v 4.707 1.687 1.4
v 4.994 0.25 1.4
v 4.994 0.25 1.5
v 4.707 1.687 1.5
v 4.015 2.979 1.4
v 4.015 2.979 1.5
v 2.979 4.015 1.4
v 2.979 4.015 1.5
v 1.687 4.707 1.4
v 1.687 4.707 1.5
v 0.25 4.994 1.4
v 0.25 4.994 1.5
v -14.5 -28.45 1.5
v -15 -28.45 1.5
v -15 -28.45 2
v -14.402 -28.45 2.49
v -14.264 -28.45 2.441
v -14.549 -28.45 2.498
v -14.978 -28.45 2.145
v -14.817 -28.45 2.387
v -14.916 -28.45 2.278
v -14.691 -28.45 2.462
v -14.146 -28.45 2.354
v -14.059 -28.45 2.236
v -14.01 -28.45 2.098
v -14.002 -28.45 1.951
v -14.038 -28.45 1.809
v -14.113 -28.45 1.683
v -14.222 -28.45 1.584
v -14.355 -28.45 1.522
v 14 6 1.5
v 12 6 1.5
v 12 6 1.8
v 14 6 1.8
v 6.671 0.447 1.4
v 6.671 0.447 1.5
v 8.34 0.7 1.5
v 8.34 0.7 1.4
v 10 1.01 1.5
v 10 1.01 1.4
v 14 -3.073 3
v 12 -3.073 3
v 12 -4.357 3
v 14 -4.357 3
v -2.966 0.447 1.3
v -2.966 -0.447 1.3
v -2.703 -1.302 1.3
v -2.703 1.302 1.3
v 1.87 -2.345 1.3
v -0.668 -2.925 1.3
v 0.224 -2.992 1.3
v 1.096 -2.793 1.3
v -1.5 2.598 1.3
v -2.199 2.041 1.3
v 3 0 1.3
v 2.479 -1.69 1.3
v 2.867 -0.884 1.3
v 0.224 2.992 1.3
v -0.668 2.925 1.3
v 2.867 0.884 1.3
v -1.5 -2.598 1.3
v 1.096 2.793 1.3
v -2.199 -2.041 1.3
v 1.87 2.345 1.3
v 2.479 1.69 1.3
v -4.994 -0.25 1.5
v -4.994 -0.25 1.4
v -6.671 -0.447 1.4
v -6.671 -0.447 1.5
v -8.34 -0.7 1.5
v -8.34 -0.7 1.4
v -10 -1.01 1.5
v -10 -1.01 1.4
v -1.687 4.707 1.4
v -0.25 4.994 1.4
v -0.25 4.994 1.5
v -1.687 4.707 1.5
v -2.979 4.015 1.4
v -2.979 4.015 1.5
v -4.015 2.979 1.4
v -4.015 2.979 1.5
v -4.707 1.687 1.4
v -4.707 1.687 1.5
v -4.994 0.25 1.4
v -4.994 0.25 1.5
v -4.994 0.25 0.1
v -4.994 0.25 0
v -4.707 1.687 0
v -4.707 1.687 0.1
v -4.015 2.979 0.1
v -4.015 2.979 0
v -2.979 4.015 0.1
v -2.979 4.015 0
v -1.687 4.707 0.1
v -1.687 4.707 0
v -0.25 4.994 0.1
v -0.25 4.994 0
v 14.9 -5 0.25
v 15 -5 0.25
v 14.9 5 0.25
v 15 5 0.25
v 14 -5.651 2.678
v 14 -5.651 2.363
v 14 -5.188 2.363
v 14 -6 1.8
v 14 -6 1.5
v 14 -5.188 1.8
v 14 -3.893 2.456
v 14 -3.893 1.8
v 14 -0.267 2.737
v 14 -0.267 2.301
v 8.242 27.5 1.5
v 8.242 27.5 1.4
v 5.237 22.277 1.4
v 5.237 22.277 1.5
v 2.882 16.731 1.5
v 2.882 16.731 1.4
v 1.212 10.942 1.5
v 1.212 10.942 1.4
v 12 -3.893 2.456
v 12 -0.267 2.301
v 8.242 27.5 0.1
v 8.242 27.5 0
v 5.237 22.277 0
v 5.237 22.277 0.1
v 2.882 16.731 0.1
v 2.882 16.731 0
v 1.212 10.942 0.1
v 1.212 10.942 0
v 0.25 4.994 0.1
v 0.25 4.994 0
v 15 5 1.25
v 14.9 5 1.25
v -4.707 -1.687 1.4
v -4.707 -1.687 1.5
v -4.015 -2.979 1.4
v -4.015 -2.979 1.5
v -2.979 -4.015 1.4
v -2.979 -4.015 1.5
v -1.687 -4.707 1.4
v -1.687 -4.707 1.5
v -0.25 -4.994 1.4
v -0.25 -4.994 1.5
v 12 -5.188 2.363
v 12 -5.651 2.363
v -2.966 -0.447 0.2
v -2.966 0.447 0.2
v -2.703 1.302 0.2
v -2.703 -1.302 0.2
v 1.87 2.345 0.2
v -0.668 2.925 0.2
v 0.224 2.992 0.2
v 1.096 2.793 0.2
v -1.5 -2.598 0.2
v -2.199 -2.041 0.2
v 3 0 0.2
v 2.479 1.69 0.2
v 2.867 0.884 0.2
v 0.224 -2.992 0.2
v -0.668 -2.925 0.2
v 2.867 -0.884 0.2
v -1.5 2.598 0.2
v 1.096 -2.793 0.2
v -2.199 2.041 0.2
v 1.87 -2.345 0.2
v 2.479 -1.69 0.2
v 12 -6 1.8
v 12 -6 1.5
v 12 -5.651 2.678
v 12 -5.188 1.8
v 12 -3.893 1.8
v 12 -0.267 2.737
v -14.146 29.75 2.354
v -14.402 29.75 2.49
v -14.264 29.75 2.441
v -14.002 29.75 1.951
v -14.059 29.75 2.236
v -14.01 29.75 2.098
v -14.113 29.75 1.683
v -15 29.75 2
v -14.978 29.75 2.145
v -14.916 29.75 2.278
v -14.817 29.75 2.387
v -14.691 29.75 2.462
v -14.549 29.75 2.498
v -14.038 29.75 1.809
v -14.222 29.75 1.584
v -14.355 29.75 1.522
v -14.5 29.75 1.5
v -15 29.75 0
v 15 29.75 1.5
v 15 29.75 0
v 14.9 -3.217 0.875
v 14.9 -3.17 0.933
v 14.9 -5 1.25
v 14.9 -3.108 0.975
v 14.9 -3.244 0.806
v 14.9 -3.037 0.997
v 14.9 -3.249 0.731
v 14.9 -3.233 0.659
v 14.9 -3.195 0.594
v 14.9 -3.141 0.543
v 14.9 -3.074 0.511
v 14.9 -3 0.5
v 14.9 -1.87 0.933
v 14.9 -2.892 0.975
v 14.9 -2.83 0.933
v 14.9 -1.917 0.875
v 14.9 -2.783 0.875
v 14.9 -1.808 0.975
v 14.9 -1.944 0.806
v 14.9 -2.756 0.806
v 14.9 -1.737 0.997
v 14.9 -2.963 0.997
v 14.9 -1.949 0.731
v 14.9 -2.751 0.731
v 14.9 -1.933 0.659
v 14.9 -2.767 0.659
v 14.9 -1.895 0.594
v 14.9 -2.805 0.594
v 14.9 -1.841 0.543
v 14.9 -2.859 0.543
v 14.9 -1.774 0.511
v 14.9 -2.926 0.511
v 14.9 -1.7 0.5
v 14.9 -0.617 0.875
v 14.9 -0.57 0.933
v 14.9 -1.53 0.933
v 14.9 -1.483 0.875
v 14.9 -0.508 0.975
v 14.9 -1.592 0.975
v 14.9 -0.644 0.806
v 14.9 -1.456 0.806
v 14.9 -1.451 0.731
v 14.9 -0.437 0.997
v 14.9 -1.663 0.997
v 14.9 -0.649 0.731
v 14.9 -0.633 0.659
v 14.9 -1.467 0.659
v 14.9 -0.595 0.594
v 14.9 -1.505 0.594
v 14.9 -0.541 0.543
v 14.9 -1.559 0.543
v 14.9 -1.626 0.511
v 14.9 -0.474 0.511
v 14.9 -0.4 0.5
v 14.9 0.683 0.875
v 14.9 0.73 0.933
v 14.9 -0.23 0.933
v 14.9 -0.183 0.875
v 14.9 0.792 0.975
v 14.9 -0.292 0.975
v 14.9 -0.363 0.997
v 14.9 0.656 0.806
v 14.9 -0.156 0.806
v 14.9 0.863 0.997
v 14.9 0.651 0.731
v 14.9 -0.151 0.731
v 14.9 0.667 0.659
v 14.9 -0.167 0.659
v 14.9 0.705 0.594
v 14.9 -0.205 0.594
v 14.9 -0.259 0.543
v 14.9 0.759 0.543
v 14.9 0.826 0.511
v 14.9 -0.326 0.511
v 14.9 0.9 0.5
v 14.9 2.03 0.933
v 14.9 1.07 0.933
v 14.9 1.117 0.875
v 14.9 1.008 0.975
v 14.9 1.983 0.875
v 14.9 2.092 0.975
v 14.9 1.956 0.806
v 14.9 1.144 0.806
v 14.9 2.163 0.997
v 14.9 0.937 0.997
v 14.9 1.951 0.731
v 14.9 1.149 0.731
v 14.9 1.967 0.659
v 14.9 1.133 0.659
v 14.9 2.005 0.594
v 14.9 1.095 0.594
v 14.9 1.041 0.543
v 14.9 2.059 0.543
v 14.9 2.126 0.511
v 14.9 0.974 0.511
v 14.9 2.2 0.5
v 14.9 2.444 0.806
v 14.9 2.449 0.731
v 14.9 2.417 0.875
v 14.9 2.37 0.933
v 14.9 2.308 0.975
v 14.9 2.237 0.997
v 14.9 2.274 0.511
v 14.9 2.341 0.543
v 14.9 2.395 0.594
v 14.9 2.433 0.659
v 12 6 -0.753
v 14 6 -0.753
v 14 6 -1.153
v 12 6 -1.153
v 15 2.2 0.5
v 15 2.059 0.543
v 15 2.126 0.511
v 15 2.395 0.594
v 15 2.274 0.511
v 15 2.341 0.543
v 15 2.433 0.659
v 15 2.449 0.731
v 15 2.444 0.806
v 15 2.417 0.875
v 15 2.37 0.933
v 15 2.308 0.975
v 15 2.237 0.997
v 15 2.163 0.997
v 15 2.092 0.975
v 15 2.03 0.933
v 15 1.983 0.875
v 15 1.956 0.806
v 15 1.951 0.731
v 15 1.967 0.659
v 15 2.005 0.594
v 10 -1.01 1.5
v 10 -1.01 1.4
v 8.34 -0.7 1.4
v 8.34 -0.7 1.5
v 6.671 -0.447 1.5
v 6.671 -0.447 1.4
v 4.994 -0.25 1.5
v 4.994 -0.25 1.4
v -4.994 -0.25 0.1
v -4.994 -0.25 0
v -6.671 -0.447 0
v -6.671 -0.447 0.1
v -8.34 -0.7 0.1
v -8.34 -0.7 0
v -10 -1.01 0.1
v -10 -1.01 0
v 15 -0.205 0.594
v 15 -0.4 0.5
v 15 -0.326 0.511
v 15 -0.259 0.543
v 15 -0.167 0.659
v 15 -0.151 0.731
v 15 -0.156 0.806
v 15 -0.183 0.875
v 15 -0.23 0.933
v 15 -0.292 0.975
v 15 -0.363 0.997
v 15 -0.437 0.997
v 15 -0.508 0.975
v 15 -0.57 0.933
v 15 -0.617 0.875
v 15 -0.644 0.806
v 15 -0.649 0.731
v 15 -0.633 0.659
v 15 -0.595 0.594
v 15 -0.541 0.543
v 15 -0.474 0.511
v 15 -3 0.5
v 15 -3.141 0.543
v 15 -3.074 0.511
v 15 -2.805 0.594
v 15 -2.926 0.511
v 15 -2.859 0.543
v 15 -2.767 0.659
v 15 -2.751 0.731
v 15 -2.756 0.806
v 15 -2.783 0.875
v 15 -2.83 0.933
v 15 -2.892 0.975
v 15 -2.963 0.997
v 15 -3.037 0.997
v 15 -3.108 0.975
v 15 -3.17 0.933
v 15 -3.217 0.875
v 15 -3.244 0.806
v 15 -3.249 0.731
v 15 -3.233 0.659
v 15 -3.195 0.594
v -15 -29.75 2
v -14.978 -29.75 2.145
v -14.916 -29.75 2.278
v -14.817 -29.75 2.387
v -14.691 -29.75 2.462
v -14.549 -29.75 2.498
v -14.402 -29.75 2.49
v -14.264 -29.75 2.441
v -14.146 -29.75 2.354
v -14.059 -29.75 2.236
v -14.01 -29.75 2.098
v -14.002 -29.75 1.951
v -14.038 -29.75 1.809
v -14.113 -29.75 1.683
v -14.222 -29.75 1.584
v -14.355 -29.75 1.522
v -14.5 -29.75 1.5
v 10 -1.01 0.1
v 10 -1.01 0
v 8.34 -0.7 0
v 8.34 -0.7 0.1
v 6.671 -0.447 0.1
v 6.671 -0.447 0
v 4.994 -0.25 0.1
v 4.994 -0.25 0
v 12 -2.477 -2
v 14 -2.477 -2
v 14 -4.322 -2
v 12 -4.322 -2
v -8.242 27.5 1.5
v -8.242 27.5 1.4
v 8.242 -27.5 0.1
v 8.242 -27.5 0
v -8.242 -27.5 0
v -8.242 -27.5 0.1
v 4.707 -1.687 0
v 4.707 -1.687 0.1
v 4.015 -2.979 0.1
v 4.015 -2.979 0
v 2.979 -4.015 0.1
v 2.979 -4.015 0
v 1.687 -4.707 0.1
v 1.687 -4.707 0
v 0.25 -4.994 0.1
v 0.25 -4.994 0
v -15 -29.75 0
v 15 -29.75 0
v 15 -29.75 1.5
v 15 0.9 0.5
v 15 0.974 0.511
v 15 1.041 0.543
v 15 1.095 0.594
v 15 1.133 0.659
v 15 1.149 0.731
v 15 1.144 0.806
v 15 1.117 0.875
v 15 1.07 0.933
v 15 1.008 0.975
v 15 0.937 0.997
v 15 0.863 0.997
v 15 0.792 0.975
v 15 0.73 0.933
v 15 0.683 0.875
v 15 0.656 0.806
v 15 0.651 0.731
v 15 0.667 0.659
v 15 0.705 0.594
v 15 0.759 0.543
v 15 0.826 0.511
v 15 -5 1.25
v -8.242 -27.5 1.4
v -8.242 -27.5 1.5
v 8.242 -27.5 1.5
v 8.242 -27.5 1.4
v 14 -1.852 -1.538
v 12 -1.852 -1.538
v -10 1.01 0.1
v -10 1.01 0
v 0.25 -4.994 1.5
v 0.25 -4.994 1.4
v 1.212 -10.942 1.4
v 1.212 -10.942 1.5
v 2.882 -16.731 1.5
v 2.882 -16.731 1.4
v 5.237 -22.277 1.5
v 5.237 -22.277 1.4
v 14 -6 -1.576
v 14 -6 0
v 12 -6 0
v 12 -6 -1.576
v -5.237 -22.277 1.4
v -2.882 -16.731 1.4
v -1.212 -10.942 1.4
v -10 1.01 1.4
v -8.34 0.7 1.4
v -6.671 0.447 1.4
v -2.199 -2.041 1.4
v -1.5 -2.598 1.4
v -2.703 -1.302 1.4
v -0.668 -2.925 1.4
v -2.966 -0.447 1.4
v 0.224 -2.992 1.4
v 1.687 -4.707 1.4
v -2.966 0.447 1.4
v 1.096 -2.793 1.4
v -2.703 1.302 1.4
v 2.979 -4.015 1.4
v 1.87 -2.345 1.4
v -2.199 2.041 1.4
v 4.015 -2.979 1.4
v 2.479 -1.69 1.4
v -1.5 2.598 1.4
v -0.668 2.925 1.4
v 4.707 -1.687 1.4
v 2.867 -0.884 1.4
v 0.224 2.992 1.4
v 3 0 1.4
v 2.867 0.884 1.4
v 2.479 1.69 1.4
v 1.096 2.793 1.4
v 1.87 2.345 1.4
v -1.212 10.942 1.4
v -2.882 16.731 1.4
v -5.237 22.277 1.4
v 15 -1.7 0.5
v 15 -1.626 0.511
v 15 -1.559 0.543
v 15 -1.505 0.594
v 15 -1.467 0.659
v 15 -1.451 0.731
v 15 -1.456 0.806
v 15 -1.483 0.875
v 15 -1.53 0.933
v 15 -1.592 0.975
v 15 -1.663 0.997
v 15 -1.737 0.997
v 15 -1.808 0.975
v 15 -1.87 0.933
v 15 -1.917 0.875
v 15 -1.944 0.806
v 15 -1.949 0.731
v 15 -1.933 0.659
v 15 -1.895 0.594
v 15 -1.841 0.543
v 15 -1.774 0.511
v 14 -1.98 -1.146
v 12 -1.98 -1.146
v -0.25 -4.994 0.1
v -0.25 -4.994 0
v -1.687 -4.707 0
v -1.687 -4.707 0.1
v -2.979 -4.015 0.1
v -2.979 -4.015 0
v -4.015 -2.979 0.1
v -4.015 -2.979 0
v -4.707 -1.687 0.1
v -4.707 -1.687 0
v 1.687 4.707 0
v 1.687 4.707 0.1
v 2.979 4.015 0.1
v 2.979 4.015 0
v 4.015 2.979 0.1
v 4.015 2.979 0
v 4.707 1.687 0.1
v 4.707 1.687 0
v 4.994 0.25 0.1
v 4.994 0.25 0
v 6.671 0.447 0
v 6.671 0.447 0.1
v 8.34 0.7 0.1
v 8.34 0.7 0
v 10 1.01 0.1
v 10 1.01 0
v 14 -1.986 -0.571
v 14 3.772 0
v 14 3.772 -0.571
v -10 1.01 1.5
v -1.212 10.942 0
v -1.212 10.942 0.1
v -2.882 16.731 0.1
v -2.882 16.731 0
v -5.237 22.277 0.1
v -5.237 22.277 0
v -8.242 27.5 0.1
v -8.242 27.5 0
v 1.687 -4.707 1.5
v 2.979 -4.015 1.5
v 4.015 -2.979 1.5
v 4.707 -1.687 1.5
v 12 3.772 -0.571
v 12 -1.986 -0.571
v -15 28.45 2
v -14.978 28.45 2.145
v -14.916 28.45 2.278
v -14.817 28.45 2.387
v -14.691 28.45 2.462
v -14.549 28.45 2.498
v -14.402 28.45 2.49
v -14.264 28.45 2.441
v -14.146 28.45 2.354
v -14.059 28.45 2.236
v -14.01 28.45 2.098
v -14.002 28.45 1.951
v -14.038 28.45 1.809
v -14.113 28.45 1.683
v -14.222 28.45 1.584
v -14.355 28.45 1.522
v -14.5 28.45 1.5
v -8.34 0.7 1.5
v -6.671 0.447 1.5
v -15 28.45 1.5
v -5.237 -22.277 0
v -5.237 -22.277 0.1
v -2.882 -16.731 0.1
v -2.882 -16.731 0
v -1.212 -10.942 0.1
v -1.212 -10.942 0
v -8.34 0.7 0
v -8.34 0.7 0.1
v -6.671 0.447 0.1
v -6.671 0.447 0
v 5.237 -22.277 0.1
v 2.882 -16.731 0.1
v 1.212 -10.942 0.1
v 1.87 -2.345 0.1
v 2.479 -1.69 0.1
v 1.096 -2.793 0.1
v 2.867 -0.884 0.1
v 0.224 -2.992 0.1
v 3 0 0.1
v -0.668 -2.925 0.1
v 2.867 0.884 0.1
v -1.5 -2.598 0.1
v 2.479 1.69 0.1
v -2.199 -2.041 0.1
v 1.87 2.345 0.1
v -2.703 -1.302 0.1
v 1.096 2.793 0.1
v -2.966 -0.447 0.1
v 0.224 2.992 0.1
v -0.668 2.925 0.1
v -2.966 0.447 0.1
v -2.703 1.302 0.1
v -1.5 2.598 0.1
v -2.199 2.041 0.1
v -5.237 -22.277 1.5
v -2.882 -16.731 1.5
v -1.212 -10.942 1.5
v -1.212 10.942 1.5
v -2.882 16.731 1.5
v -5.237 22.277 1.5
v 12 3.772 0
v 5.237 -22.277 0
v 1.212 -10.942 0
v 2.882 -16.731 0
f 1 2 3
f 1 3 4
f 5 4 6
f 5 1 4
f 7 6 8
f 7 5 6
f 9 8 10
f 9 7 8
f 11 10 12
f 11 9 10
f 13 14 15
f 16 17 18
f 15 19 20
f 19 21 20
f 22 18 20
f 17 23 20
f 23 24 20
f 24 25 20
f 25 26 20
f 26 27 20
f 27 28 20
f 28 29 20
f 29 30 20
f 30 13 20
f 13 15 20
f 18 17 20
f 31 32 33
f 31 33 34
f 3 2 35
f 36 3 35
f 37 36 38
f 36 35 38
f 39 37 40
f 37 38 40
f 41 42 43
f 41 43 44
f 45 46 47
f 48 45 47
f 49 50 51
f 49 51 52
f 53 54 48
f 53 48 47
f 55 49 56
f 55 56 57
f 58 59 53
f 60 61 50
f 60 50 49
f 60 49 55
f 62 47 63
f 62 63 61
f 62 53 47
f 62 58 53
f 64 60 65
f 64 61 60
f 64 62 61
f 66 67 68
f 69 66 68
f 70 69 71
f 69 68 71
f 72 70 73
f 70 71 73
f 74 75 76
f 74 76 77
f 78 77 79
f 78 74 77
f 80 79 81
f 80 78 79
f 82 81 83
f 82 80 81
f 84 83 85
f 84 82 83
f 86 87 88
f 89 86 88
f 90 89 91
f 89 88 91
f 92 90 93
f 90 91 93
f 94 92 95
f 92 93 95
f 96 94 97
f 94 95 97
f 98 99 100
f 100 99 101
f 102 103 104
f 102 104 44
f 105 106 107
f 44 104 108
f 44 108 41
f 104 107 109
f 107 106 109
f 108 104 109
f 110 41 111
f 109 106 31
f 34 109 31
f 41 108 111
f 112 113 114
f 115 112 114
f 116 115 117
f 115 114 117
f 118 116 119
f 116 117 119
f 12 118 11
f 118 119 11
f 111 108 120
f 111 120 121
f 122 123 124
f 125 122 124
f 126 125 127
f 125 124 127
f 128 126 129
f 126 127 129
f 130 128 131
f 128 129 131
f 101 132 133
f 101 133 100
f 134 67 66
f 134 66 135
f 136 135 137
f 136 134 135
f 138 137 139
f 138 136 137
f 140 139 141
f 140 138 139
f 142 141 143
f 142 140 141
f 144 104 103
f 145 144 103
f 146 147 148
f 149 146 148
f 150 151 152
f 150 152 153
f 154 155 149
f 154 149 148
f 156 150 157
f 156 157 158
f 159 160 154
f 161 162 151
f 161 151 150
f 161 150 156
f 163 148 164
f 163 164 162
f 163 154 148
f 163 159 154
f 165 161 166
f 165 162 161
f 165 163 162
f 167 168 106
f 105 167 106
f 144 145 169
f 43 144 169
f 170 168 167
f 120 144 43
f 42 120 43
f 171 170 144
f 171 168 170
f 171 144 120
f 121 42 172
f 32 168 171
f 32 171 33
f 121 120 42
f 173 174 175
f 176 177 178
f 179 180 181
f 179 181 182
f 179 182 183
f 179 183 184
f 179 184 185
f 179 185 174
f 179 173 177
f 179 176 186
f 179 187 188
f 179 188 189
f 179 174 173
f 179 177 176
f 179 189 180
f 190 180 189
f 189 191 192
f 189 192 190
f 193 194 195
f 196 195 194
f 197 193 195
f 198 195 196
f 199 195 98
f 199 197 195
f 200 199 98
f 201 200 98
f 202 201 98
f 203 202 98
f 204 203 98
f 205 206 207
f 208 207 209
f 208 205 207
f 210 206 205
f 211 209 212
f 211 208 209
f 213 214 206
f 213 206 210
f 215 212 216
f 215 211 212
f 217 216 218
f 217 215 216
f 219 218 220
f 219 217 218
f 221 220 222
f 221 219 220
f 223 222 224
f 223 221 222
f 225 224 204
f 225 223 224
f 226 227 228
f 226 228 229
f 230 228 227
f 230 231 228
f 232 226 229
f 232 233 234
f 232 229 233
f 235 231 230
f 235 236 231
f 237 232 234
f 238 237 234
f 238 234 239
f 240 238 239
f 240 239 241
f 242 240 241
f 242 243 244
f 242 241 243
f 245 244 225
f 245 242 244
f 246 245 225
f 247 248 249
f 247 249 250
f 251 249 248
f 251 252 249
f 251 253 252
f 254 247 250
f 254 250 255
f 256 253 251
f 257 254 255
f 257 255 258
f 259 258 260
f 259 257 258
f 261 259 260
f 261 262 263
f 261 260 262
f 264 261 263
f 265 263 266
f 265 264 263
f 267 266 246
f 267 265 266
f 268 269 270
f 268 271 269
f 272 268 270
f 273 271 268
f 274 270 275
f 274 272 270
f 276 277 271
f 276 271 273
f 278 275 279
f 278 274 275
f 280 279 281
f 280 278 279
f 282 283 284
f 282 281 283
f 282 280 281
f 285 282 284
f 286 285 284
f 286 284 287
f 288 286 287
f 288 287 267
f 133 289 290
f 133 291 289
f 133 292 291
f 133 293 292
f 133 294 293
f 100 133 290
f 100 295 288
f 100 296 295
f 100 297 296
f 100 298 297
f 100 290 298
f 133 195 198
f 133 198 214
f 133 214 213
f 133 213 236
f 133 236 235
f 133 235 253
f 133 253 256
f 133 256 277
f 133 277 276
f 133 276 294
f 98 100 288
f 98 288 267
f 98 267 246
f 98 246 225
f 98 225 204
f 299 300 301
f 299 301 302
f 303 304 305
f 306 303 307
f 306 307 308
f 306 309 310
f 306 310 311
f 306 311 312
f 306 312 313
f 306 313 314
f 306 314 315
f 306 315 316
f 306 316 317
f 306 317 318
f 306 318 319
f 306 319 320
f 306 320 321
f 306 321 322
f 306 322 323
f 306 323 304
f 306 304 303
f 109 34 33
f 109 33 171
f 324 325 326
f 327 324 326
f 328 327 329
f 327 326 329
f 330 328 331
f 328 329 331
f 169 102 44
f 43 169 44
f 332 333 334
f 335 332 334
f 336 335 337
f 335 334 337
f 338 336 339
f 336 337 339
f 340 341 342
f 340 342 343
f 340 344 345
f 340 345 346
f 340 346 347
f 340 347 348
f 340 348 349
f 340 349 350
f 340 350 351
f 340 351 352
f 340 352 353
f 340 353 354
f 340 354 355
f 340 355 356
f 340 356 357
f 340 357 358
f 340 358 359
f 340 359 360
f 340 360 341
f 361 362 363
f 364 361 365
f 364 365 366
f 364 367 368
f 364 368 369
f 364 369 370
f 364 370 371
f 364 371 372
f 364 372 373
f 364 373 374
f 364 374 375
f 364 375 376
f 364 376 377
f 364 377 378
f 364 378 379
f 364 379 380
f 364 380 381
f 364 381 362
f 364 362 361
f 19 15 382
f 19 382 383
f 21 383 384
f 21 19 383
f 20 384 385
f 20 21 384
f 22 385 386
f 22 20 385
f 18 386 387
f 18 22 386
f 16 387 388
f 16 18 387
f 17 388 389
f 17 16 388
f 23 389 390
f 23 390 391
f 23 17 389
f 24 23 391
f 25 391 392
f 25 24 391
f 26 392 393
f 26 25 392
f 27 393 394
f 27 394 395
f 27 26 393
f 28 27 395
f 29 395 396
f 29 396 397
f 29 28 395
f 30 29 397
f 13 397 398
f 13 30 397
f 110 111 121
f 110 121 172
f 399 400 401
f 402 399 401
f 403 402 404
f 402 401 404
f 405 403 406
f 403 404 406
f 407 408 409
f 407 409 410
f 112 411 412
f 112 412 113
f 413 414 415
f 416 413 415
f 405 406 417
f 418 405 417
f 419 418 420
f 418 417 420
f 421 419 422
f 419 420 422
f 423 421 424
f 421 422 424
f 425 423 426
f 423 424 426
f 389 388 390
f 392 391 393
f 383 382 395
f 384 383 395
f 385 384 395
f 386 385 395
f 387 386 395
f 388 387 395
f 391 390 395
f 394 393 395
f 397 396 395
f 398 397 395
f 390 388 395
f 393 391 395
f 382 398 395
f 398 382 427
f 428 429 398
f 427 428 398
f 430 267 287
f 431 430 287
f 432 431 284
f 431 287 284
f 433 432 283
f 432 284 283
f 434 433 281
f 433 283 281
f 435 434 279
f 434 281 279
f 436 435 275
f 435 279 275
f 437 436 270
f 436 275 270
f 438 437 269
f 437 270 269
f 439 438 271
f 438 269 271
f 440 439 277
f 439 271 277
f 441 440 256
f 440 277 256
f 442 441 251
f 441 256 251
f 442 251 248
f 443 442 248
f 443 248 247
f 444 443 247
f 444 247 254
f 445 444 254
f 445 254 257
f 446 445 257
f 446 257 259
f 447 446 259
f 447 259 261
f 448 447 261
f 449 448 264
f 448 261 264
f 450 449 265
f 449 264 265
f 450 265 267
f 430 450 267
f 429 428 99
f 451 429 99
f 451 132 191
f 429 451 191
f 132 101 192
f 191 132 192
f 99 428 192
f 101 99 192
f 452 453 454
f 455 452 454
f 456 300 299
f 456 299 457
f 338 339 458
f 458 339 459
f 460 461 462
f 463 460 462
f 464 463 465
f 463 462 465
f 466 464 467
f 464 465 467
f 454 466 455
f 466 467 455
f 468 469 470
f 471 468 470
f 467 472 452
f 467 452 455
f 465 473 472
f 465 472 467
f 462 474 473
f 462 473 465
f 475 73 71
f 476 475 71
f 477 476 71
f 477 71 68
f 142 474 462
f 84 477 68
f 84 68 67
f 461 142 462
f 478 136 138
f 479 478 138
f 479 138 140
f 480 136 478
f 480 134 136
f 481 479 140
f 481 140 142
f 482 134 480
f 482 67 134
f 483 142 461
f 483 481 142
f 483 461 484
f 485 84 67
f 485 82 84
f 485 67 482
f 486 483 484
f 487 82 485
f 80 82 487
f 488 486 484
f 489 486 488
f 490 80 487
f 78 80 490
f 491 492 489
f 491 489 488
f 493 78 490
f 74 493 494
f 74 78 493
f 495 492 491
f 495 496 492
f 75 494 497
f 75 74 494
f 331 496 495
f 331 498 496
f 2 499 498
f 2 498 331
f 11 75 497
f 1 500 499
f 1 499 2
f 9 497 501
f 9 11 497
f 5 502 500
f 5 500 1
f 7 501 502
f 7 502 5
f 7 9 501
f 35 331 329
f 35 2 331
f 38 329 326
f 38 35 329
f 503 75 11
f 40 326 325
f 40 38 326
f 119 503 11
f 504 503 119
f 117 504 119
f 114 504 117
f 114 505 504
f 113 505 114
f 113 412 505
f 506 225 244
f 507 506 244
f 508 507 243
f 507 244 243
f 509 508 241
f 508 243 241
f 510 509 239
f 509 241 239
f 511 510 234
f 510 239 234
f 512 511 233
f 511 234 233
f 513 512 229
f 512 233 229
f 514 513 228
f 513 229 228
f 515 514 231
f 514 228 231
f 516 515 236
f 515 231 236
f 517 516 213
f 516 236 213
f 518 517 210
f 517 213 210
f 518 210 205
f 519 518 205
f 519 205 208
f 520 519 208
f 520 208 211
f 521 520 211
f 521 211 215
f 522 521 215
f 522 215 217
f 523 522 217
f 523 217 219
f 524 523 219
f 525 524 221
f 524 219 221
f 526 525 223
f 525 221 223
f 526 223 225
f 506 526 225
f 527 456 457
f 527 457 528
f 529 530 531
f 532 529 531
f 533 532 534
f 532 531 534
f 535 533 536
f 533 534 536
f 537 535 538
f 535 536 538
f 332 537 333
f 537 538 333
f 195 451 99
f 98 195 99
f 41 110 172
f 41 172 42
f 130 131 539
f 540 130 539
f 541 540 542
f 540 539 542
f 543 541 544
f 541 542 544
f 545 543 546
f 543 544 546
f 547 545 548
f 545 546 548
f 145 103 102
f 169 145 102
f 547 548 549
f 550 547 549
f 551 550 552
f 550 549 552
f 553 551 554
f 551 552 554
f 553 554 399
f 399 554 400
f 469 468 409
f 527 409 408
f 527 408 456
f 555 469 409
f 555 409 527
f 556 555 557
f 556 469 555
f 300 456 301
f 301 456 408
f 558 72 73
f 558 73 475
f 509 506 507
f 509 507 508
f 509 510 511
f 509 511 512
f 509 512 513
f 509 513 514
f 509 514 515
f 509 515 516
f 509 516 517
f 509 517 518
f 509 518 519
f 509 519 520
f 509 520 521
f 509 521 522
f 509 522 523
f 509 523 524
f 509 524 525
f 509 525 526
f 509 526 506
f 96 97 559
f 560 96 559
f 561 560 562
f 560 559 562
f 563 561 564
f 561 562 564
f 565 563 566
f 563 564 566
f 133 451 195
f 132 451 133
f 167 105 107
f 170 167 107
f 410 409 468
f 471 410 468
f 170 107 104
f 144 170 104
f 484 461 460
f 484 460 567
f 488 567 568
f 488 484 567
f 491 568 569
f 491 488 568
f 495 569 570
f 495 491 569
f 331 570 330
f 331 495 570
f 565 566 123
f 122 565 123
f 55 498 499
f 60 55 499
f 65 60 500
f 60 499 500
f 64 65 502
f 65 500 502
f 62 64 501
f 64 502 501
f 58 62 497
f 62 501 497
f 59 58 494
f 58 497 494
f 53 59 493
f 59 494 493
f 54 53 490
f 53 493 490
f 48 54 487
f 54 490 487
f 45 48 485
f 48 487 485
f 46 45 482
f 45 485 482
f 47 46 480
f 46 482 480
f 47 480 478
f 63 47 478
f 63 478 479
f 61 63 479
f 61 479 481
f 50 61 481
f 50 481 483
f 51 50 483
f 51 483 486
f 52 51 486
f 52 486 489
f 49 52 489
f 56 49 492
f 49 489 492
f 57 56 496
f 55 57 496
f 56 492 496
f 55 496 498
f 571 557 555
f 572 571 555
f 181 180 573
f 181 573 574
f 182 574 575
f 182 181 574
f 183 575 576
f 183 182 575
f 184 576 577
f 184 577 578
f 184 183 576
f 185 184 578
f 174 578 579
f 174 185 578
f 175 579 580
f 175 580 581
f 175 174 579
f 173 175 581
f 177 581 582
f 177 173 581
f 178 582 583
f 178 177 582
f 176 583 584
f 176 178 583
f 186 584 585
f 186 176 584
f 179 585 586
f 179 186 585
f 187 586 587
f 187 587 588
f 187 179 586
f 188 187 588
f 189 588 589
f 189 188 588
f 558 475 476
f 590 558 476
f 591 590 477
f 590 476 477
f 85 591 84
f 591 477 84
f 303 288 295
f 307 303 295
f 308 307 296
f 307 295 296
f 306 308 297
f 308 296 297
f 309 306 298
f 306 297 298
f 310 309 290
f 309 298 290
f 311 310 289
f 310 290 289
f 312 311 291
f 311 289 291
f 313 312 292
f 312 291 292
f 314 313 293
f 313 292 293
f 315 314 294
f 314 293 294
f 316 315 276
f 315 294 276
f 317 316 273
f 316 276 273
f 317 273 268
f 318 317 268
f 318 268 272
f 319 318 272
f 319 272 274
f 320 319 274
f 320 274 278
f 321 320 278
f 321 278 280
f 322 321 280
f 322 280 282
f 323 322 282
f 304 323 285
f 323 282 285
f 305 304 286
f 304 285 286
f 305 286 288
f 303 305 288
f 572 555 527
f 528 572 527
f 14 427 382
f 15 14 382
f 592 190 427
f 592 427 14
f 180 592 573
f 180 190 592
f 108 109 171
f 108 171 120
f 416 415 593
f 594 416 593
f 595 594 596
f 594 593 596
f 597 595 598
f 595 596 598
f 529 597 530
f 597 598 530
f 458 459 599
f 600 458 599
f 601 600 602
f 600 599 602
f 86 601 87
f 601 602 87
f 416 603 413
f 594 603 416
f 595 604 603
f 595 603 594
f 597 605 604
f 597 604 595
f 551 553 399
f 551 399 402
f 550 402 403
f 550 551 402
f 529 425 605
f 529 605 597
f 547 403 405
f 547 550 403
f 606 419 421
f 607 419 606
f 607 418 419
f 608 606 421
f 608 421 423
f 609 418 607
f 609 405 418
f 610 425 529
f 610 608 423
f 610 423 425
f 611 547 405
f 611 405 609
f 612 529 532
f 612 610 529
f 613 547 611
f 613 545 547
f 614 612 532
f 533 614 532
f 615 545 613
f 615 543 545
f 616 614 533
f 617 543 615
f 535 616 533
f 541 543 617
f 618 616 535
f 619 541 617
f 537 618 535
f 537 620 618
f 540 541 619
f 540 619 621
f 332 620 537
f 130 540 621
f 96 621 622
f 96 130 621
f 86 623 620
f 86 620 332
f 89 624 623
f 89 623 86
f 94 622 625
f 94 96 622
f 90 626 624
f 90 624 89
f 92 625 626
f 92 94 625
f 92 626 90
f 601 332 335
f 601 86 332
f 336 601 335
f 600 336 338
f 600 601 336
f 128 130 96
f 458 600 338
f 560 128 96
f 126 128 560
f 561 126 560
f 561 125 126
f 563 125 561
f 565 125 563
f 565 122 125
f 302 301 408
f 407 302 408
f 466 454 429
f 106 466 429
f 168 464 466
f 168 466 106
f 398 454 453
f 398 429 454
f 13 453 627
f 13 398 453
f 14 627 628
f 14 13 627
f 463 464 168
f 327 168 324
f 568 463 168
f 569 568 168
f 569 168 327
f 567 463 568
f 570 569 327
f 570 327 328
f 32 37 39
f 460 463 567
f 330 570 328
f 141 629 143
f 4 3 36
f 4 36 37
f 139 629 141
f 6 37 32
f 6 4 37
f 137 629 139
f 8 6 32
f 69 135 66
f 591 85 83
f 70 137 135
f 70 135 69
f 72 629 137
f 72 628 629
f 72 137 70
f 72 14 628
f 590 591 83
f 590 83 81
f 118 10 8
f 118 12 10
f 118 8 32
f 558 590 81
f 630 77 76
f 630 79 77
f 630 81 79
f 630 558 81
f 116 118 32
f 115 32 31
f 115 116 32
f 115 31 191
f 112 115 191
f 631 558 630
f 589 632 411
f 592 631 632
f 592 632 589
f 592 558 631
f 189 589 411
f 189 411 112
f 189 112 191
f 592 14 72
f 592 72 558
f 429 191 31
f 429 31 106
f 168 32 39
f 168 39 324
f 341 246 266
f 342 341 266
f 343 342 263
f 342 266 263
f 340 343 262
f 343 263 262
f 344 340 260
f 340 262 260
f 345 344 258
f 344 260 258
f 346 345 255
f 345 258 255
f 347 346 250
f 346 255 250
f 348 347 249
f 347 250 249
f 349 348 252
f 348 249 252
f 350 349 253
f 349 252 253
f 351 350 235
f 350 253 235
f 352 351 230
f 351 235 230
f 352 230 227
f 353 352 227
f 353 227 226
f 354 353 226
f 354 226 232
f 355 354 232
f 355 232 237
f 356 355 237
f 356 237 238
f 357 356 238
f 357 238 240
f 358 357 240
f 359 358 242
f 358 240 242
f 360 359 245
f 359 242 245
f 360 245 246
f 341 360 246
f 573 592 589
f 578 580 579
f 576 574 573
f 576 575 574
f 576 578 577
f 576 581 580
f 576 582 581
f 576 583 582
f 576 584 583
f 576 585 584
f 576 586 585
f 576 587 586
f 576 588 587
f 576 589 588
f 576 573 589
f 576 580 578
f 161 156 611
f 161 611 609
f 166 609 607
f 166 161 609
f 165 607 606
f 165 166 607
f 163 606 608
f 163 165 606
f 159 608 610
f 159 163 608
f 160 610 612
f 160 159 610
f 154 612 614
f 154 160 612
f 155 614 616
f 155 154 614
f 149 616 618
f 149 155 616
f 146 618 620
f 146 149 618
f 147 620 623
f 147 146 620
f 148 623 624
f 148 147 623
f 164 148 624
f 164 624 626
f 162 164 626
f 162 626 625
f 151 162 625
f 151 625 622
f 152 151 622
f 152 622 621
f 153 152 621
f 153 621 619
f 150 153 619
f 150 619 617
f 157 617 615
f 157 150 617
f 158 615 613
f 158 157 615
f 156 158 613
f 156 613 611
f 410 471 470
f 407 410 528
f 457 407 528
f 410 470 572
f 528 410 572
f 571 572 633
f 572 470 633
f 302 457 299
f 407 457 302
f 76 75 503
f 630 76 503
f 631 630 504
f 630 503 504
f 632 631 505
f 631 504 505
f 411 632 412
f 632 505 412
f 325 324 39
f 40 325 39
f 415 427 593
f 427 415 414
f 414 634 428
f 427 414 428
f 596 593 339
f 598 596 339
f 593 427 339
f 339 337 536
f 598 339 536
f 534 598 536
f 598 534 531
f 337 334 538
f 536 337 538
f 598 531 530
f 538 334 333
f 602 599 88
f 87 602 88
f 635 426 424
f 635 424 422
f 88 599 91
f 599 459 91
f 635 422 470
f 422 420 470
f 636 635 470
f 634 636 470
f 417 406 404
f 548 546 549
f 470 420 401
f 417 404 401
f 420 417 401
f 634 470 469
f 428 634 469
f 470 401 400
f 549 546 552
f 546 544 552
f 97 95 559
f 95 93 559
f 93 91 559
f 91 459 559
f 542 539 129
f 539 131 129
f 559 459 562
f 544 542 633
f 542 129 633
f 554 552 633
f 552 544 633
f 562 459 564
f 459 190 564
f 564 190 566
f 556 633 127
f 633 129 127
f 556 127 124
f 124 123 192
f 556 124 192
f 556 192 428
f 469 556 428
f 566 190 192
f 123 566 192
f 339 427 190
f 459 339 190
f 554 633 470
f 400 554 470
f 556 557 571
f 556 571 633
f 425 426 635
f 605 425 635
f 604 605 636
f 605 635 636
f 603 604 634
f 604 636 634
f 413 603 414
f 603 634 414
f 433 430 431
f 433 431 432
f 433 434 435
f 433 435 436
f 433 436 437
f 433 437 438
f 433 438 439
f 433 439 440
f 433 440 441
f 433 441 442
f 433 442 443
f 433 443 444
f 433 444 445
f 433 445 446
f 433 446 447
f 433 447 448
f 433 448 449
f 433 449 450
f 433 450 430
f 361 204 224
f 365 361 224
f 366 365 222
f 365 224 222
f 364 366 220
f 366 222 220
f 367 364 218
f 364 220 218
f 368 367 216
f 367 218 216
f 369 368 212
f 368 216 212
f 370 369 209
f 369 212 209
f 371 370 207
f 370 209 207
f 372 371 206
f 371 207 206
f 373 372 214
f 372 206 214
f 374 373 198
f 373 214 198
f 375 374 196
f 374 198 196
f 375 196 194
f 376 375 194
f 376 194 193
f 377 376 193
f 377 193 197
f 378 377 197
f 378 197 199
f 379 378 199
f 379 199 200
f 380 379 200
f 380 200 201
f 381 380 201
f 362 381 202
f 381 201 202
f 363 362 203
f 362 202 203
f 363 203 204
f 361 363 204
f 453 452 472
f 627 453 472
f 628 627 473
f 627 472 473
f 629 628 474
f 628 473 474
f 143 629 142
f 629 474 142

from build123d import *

# Parameters (mm, degrees)
SKETCH_1_W           = 30
SKETCH_1_H           = 59.5
EXTRUDE_1_DEPTH      = 1.5
SKETCH_2_W           = 20
SKETCH_2_H           = 55
CUT_EXTRUDE_1_DEPTH  = 0.1
SKETCH_3_R           = 5
EXTRUDE_2_DEPTH      = 0.1
EXTRUDE_3_DEPTH      = 0.1
CUT_EXTRUDE_START    = -0.1
SKETCH_5_R           = 5
CUT_EXTRUDE_2_DEPTH  = 0.1
SKETCH_6_R           = 3
CUT_EXTRUDE_3_DEPTH  = 0.1
CUT_EXTRUDE_4_DEPTH  = 0.1
SKETCH_8_R           = 3
CUT_EXTRUDE_5_DEPTH  = 0.1
SKETCH_9_W           = 1
SKETCH_9_H           = 10
CUT_EXTRUDE_6_DEPTH  = 0.1
SKETCH_10_R          = 0.25
EXTRUDE_4_DEPTH      = 0.1
SKETCH_11_W          = 2
SKETCH_11_H          = 12
EXTRUDE_5_DEPTH      = 1.5
CUT_EXTRUDE_7_DEPTH  = 42.654081433
SKETCH_13_W          = 2
SKETCH_13_H          = 12
EXTRUDE_6_DEPTH      = 2
CUT_EXTRUDE_8_DEPTH  = 42.654081433
CUT_EXTRUDE_9_DEPTH  = 42.654081433
CUT_EXTRUDE_10_DEPTH = 42.654081433
SKETCH_18_R          = 0.5
EXTRUDE_7_DEPTH      = 59.5
SKETCH_19_W          = 1
SKETCH_19_H          = 56.9
CUT_EXTRUDE_11_DEPTH = 2


with BuildPart() as part:
    # 草圖1 → 填料-伸長1 (new body)
    with BuildSketch(Plane.XY):
        Rectangle(SKETCH_1_W, SKETCH_1_H)
    extrude(amount=EXTRUDE_1_DEPTH)

    # 草圖2 → 除料-伸長1 (cut)
    with BuildSketch(Plane.XY.offset(1.5)):
        Rectangle(SKETCH_2_W, SKETCH_2_H)
    extrude(amount=-CUT_EXTRUDE_1_DEPTH, mode=Mode.SUBTRACT)

    # 草圖3 → 填料-伸長2 (add)
    with BuildSketch(Plane.XY.offset(1.4)):
        Circle(SKETCH_3_R)
    extrude(amount=EXTRUDE_2_DEPTH)

    # 草圖4 → 填料-伸長3 (add)
    with BuildSketch(Plane.XY.offset(1.4)):
        with BuildLine():
            ThreePointArc((4.993746089, 0.25), (7.506502742, 0.566687178), (10, 1.010205144))
            Line((10, 1.010205144), (10, 27.5))
            Line((10, 27.5), (8.241767279, 27.5))
            ThreePointArc((8.241767279, 27.5), (2.882359671, 16.731048078), (0.25, 4.993746089))
            ThreePointArc((0.25, 4.993746089), (3.535533906, 3.535533906), (4.993746089, 0.25))
        make_face()
        with BuildLine():
            ThreePointArc((0.25, -4.993746089), (2.882359671, -16.731048078), (8.241767279, -27.5))
            Line((8.241767279, -27.5), (10, -27.5))
            Line((10, -27.5), (10, -1.010205144))
            ThreePointArc((10, -1.010205144), (7.506502742, -0.566687178), (4.993746089, -0.25))
            ThreePointArc((4.993746089, -0.25), (3.535533906, -3.535533906), (0.25, -4.993746089))
        make_face()
        with BuildLine():
            Line((-10, -27.5), (-8.241767279, -27.5))
            ThreePointArc((-8.241767279, -27.5), (-2.882359671, -16.731048078), (-0.25, -4.993746089))
            ThreePointArc((-0.25, -4.993746089), (-3.535533906, -3.535533906), (-4.993746089, -0.25))
            ThreePointArc((-4.993746089, -0.25), (-7.506502742, -0.566687178), (-10, -1.010205144))
            Line((-10, -1.010205144), (-10, -27.5))
        make_face()
        with BuildLine():
            Line((-10, 27.5), (-10, 1.010205144))
            ThreePointArc((-10, 1.010205144), (-7.506502742, 0.566687178), (-4.993746089, 0.25))
            ThreePointArc((-4.993746089, 0.25), (-3.535533906, 3.535533906), (-0.25, 4.993746089))
            ThreePointArc((-0.25, 4.993746089), (-2.882359671, 16.731048078), (-8.241767279, 27.5))
            Line((-8.241767279, 27.5), (-10, 27.5))
        make_face()
    extrude(amount=EXTRUDE_3_DEPTH)

    # 草圖5 → 除料-伸長2 (cut)
    with BuildSketch(Plane.XY.offset(1.5).offset(CUT_EXTRUDE_START)):
        Circle(SKETCH_5_R)
    extrude(amount=CUT_EXTRUDE_2_DEPTH, mode=Mode.SUBTRACT)

    # 草圖6 → 除料-伸長3 (cut)
    with BuildSketch(Plane.XY.offset(1.4)):
        Circle(SKETCH_6_R)
    extrude(amount=-CUT_EXTRUDE_3_DEPTH, mode=Mode.SUBTRACT)

    # 草圖7 → 除料-伸長4 (cut)
    with BuildSketch(Plane(origin=(0, 0, 0), x_dir=(-1, 0, 0), z_dir=(0, 0, -1))):
        with BuildLine():
            Line((-8.241767279, -27.5), (8.241767279, -27.5))
            ThreePointArc((8.241767279, -27.5), (2.882359671, -16.731048078), (0.25, -4.993746089))
            ThreePointArc((0.25, -4.993746089), (3.535533906, -3.535533906), (4.993746089, -0.25))
            ThreePointArc((4.993746089, -0.25), (7.506502742, -0.566687178), (10, -1.010205144))
            Line((10, -1.010205144), (10, 1.010205144))
            ThreePointArc((10, 1.010205144), (7.506502742, 0.566687178), (4.993746089, 0.25))
            ThreePointArc((4.993746089, 0.25), (3.535533906, 3.535533906), (0.25, 4.993746089))
            ThreePointArc((0.25, 4.993746089), (2.882359671, 16.731048078), (8.241767279, 27.5))
            Line((8.241767279, 27.5), (-8.241767279, 27.5))
            ThreePointArc((-8.241767279, 27.5), (-2.882359671, 16.731048078), (-0.25, 4.993746089))
            ThreePointArc((-0.25, 4.993746089), (-3.535533906, 3.535533906), (-4.993746089, 0.25))
            ThreePointArc((-4.993746089, 0.25), (-7.506502742, 0.566687178), (-10, 1.010205144))
            Line((-10, 1.010205144), (-10, -1.010205144))
            ThreePointArc((-10, -1.010205144), (-7.506502742, -0.566687178), (-4.993746089, -0.25))
            ThreePointArc((-4.993746089, -0.25), (-3.535533906, -3.535533906), (-0.25, -4.993746089))
            ThreePointArc((-0.25, -4.993746089), (-2.882359671, -16.731048078), (-8.241767279, -27.5))
        make_face()
    extrude(amount=-CUT_EXTRUDE_4_DEPTH, mode=Mode.SUBTRACT)

    # 草圖8 → 除料-伸長5 (cut)
    with BuildSketch(Plane(origin=(0, 0, 0.1), x_dir=(-1, 0, 0), z_dir=(0, 0, -1)).offset(CUT_EXTRUDE_START)):
        with Locations(Location((0, 0, 0), (0, 0, 180))):
            Circle(SKETCH_8_R)
    extrude(amount=CUT_EXTRUDE_5_DEPTH, mode=Mode.SUBTRACT)

    # 草圖9 → 除料-伸長6 (cut)
    with BuildSketch(Plane(origin=(15, 0, 0), x_dir=(0, 0, -1), z_dir=(1, 0, 0))):
        with Locations((-0.75, 0)):
            Rectangle(SKETCH_9_W, SKETCH_9_H)
    extrude(amount=-CUT_EXTRUDE_6_DEPTH, mode=Mode.SUBTRACT)

    # 草圖10 → 填料-伸長4 (add)
    with BuildSketch(Plane(origin=(14.9, 0, 0), x_dir=(0, 0, -1), z_dir=(1, 0, 0))):
        with Locations((-0.75, -3)):
            Circle(SKETCH_10_R)
        with Locations((-0.75, -1.7)):
            Circle(SKETCH_10_R)
        with Locations((-0.75, -0.4)):
            Circle(SKETCH_10_R)
        with Locations((-0.75, 0.9)):
            Circle(SKETCH_10_R)
        with Locations((-0.75, 2.2)):
            Circle(SKETCH_10_R)
    extrude(amount=EXTRUDE_4_DEPTH)

    # 草圖11 → 填料-伸長5 (add)
    with BuildSketch(Plane.XY.offset(1.5)):
        with Locations((13, 0)):
            Rectangle(SKETCH_11_W, SKETCH_11_H)
    extrude(amount=EXTRUDE_5_DEPTH)

    # 草圖12 → 除料-伸長7 (cut, through all)
    with BuildSketch(Plane(origin=(14, 0, 0), x_dir=(0, 0, -1), z_dir=(1, 0, 0))):
        Polygon((-1.8, 6), (-1.8, -3.892813963), (-2.45595706, -3.892813963), (-2.301062562, -0.267088334), (-2.736577143, -0.267088334), (-3, -3.073435974), (-3, 6), align=None)
        Polygon((-3, -6), (-1.8, -6), (-1.8, -5.188306953), (-2.363031893, -5.188306953), (-2.363031893, -5.650911739), (-2.678275837, -5.650911739), (-3, -4.356848884), align=None)
    extrude(amount=-CUT_EXTRUDE_7_DEPTH, mode=Mode.SUBTRACT)

    # 草圖13 → 填料-伸長6 (add)
    with BuildSketch(Plane(origin=(0, 0, 0), x_dir=(-1, 0, 0), z_dir=(0, 0, -1))):
        with Locations((-13, 0)):
            Rectangle(SKETCH_13_W, SKETCH_13_H)
    extrude(amount=EXTRUDE_6_DEPTH)

    # 草圖14 → 除料-伸長8 (cut, through all)
    with BuildSketch(Plane(origin=(14, 0, 0), x_dir=(0, 0, -1), z_dir=(1, 0, 0))):
        Polygon((1.152930519, 6), (2, -2.477443224), (2, 6), align=None)
        Polygon((2, -4.322370965), (1.57646526, -6), (2, -6), align=None)
    extrude(amount=-CUT_EXTRUDE_8_DEPTH, mode=Mode.SUBTRACT)

    # 草圖15 → 除料-伸長9 (cut, through all)
    with BuildSketch(Plane(origin=(14, 0, 0), x_dir=(0, 0, -1), z_dir=(1, 0, 0))):
        Polygon((0.753392093, 6), (1.537923786, -1.851567128), (1.145657939, -1.979765392), (0.570903406, 3.772358885), (0, 3.772358885), (0, 6), align=None)
    extrude(amount=-CUT_EXTRUDE_9_DEPTH, mode=Mode.SUBTRACT)

    # 草圖17 → 除料-伸長10 (cut, through all)
    with BuildSketch(Plane(origin=(14, 0, 0), x_dir=(0, 0, -1), z_dir=(1, 0, 0))):
        Polygon((0.570903406, 3.772358885), (0.570903406, -1.986165117), (1.145657939, -1.979765392), align=None)
    extrude(amount=-CUT_EXTRUDE_10_DEPTH, mode=Mode.SUBTRACT)

    # 草圖18 → 填料-伸長7 (add, through all)
    with BuildSketch(Plane(origin=(0, 29.75, 0), x_dir=(1, 0, 0), z_dir=(0, 1, 0))):
        with Locations((-14.5, -2)):
            Circle(SKETCH_18_R)
        with BuildLine():
            Line((-14.5, -1.5), (-15, -1.5))
            Line((-15, -1.5), (-15, -2))
            ThreePointArc((-15, -2), (-14.853553391, -1.646446609), (-14.5, -1.5))
        make_face()
    extrude(amount=-EXTRUDE_7_DEPTH)

    # 草圖19 → 除料-伸長11 (cut)
    with BuildSketch(Plane.ZY.offset(15)):
        with Locations((2, 0)):
            Rectangle(SKETCH_19_W, SKETCH_19_H)
    extrude(amount=-CUT_EXTRUDE_11_DEPTH, mode=Mode.SUBTRACT)


solid = part.part
